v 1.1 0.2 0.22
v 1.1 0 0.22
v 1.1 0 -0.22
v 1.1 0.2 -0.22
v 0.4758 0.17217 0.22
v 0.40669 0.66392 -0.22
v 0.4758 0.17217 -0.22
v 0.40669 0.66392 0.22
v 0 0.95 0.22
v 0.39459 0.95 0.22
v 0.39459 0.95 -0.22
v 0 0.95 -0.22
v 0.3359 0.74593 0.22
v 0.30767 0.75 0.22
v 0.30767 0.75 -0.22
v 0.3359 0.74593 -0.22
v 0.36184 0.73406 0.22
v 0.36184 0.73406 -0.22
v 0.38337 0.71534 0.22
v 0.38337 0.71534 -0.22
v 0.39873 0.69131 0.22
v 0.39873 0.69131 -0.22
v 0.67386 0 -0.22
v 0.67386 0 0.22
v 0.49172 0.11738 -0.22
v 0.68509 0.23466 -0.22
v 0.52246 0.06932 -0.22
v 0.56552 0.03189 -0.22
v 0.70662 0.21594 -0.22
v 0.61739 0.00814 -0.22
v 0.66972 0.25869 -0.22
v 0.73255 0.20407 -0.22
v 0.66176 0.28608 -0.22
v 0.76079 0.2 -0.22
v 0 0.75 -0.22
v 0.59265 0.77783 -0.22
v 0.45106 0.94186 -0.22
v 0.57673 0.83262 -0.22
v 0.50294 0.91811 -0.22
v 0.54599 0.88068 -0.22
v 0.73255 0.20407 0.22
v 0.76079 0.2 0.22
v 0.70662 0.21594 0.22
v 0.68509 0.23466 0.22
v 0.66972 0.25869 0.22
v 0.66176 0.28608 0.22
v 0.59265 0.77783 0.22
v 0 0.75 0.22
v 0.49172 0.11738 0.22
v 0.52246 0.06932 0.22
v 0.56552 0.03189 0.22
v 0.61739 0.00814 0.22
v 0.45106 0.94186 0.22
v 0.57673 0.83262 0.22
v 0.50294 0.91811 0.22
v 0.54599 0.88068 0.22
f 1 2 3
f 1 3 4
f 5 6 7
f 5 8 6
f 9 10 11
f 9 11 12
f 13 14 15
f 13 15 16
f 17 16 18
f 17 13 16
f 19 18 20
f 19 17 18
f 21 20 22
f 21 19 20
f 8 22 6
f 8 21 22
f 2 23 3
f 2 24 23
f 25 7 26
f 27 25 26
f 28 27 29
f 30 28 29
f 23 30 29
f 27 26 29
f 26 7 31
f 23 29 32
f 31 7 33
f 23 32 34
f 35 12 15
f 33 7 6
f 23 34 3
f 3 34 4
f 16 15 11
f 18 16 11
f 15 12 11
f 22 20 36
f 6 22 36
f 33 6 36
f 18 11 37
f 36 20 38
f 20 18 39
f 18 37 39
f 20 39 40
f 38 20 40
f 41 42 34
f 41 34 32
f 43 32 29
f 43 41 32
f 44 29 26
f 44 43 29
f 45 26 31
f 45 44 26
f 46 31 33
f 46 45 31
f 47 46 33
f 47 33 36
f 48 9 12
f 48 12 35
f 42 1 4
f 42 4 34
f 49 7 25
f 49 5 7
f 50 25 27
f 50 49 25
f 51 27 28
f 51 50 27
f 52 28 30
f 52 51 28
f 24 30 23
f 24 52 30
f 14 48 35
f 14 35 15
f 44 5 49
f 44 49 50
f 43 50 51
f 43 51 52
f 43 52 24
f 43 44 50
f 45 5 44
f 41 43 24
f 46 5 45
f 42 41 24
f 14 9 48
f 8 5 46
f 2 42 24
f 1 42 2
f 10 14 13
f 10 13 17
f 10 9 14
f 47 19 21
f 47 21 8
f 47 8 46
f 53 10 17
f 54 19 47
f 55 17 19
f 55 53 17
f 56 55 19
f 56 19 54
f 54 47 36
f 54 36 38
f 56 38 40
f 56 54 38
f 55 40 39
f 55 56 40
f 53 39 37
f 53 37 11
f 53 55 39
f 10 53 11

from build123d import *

# Parameters (mm, degrees)
EXTRUDE_1_DEPTH      = 0.22
EXTRUDE_1_DEPTH_BACK = 0.22


with BuildPart() as part:
    # Эскиз1 → Бобышка-Вытянуть1 (new, two sides: drawn at the far end of the back side and taken through both)
    with BuildSketch(Plane.XY.offset(-EXTRUDE_1_DEPTH_BACK)):
        with BuildLine():
            Line((0.673857348, 0), (1.1, 0))
            Line((1.1, 0), (1.1, 0.2))
            Line((1.1, 0.2), (0.760786021, 0.2))
            ThreePointArc((0.760786021, 0.2), (0.695180118, 0.224529042), (0.661759214, 0.28608269))
            Line((0.661759214, 0.28608269), (0.592647988, 0.77783462))
            ThreePointArc((0.592647988, 0.77783462), (0.52580618, 0.900941916), (0.394594374, 0.95))
            Line((0.394594374, 0.95), (0, 0.95))
            Line((0, 0.95), (0, 0.75))
            Line((0, 0.75), (0.3076657, 0.75))
            ThreePointArc((0.3076657, 0.75), (0.373271603, 0.725470958), (0.406692507, 0.66391731))
            Line((0.406692507, 0.66391731), (0.475803734, 0.17216538))
            ThreePointArc((0.475803734, 0.17216538), (0.542645542, 0.049058084), (0.673857348, 0))
        make_face()
    extrude(amount=EXTRUDE_1_DEPTH + EXTRUDE_1_DEPTH_BACK)


solid = part.part
